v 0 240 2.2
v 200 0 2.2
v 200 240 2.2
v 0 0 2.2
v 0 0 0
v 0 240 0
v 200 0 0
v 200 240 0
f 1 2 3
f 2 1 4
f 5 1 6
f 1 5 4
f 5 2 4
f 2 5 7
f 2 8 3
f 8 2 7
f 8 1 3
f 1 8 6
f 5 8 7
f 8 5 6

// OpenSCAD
// Camera calibration checkerboard for a Bambu Lab X1-Carbon + AMS.
// Export part="black" and part="white" separately as STL, then import both
// together into Bambu Studio as one object with multiple parts.

/* [Pattern] */
square_mm = 40;          // Checker square edge length in mm
columns = 5;             // Number of squares across
rows = 6;                // Number of squares down

/* [Print layers] */
layer_mm = 0.20;         // Slice at this layer height
base_layers = 9;         // Black base: 1.8 mm at 0.20 mm layers
face_layers = 2;         // White material: only 2 top layers (0.4 mm)

/* [Export] */
part = "both";           // [both,black,white]

base_mm = base_layers * layer_mm;
face_mm = face_layers * layer_mm;

assert(square_mm > 0);
assert(columns >= 2 && rows >= 2);
assert(base_layers >= 3 && face_layers >= 1);

module tile(col, row) {
    translate([col * square_mm, row * square_mm, base_mm])
        cube([square_mm, square_mm, face_mm]);
}

module black_body() {
    // Contiguous base; black face squares fill the other half of the top layer.
    union() {
        cube([columns * square_mm, rows * square_mm, base_mm]);
        for (row = [0:rows-1], col = [0:columns-1])
            if ((row + col) % 2 == 0) tile(col, row);
    }
}

module white_face() {
    // Only the visible light squares consume white filament.
    for (row = [0:rows-1], col = [0:columns-1])
        if ((row + col) % 2 == 1) tile(col, row);
}

if (part == "black") black_body();
else if (part == "white") white_face();
else if (part == "both") {
    color("black") black_body();
    color("white") white_face();
} else assert(false, "part must be both, black, or white");
